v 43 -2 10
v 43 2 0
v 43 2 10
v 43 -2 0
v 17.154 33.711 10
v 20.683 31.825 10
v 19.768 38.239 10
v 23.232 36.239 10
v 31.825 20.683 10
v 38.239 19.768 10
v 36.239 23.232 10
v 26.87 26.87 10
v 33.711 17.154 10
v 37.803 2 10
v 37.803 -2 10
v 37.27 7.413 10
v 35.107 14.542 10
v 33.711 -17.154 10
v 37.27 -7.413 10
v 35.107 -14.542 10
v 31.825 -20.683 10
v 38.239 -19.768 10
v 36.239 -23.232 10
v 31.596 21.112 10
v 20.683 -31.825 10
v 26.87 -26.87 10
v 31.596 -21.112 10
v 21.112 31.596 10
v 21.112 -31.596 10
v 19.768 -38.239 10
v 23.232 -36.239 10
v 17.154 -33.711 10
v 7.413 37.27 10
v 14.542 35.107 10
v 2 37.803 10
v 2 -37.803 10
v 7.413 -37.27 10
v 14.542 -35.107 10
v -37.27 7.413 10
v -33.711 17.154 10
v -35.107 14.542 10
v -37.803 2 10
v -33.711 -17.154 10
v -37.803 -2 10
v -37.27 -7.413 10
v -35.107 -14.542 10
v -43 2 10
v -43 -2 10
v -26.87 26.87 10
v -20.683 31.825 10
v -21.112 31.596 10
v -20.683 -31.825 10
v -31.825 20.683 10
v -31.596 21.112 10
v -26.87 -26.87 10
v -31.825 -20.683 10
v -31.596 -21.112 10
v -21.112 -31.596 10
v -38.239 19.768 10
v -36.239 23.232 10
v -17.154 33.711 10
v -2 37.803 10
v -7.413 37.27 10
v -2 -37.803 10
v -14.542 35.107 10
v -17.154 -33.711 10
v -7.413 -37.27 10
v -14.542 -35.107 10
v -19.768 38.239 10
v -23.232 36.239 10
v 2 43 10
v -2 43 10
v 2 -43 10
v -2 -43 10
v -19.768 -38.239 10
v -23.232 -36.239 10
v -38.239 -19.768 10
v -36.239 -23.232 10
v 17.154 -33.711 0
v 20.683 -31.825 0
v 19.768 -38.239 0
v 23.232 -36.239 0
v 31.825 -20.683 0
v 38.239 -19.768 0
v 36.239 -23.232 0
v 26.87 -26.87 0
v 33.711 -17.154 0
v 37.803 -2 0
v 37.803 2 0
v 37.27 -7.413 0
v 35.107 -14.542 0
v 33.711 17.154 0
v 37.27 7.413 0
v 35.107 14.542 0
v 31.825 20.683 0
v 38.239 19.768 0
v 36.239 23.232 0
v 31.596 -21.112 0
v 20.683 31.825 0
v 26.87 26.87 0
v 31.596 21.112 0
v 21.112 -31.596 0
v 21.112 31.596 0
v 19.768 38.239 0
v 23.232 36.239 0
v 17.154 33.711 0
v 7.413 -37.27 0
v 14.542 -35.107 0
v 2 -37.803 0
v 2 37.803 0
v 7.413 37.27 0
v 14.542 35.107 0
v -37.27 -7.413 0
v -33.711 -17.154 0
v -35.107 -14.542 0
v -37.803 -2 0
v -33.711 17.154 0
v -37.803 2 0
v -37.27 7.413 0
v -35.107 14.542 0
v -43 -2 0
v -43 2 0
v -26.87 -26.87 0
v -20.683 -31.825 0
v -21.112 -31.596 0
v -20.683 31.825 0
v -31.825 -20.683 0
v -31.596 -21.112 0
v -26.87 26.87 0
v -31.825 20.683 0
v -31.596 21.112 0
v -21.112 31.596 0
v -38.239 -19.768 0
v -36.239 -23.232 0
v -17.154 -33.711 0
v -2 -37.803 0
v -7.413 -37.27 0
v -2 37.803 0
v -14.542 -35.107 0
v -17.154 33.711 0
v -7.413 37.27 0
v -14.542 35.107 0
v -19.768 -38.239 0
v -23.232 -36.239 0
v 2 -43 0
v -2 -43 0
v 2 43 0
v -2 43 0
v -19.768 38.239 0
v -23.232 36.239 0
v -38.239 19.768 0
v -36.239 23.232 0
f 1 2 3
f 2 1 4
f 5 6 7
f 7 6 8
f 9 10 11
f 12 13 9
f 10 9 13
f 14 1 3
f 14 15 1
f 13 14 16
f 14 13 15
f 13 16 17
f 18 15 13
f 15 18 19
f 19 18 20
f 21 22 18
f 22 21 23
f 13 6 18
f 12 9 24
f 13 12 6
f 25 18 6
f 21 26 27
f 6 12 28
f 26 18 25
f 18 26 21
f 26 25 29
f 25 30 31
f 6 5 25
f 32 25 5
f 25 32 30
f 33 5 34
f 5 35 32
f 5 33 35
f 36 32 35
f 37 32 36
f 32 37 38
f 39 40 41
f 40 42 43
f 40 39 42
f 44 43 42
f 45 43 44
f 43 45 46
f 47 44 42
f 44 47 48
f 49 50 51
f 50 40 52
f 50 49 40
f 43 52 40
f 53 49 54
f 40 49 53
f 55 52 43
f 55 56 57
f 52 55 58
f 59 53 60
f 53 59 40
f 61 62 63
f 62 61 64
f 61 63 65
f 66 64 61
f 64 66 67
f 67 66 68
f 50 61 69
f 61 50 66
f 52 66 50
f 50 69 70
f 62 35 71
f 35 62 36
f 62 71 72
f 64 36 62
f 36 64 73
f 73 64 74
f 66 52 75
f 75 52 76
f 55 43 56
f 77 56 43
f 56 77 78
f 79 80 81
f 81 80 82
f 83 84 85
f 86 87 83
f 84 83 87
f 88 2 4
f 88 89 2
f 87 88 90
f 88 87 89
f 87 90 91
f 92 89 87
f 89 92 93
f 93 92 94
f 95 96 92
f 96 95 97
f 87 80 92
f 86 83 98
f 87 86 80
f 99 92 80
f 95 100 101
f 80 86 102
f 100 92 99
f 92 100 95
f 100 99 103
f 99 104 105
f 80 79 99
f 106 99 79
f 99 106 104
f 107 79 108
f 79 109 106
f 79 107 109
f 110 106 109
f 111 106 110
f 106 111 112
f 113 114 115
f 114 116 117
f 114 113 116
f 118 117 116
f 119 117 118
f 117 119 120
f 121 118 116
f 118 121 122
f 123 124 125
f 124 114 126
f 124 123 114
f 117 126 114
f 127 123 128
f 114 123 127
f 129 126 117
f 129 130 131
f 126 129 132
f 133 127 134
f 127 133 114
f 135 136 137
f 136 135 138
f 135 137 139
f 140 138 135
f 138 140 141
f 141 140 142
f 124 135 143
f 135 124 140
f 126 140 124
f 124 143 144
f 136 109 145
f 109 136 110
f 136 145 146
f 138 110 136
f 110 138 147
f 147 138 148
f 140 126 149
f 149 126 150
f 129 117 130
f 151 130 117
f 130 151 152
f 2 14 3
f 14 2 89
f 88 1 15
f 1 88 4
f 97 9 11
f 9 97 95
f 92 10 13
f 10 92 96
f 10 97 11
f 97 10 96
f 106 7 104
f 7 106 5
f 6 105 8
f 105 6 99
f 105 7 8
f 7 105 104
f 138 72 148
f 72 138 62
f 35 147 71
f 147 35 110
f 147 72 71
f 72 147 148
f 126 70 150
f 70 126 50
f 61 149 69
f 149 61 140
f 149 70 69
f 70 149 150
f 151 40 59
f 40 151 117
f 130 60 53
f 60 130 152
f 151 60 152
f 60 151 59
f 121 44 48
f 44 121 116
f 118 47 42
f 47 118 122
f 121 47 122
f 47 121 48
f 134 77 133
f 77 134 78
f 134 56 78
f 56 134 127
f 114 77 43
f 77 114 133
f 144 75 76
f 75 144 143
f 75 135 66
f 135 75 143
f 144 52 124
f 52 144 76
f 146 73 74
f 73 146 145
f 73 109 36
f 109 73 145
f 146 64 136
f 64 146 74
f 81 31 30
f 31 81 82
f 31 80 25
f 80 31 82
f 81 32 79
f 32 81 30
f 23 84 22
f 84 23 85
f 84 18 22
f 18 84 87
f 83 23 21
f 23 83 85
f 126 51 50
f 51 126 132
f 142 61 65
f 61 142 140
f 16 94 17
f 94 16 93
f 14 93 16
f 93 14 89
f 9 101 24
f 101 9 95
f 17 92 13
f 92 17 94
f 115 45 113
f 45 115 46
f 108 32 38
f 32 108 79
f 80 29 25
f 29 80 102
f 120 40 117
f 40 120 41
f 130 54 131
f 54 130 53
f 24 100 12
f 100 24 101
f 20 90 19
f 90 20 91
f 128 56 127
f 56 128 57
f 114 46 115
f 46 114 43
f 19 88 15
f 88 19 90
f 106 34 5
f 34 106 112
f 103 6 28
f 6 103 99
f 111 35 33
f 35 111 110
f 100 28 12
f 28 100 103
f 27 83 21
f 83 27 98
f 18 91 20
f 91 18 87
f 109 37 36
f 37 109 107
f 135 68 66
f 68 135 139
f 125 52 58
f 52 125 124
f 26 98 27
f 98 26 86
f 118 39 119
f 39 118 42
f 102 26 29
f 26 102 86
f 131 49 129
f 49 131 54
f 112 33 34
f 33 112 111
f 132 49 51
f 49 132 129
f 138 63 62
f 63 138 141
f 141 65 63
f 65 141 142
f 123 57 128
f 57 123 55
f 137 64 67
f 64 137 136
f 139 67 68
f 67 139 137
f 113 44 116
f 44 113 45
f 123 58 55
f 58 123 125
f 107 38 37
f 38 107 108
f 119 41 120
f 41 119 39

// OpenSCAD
$fn = 32;

// ----------------------------------------------------------------------
// Spur blank: plain gear blank
// ----------------------------------------------------------------------

// --- parameters (mm) ---
disc_r = 38;              // blank root radius
disc_t = 10;              // blank thickness
n_teeth = 12;             // stub tooth count
tooth_w = 4;              // tooth width at the root
tooth_h = 5;              // tooth height above the root

out_r = disc_r + tooth_h;  // tip radius
bbox_x = 86.0;  // measured width over the teeth
bbox_y = 86.0;  // measured depth over the teeth

union() {
  cylinder(r = disc_r, h = disc_t);
  for (i = [0 : n_teeth - 1])
    rotate([0, 0, i * 360 / n_teeth])
      translate([disc_r - 1, -tooth_w / 2, 0])
        cube([tooth_h + 1, tooth_w, disc_t]);
}
